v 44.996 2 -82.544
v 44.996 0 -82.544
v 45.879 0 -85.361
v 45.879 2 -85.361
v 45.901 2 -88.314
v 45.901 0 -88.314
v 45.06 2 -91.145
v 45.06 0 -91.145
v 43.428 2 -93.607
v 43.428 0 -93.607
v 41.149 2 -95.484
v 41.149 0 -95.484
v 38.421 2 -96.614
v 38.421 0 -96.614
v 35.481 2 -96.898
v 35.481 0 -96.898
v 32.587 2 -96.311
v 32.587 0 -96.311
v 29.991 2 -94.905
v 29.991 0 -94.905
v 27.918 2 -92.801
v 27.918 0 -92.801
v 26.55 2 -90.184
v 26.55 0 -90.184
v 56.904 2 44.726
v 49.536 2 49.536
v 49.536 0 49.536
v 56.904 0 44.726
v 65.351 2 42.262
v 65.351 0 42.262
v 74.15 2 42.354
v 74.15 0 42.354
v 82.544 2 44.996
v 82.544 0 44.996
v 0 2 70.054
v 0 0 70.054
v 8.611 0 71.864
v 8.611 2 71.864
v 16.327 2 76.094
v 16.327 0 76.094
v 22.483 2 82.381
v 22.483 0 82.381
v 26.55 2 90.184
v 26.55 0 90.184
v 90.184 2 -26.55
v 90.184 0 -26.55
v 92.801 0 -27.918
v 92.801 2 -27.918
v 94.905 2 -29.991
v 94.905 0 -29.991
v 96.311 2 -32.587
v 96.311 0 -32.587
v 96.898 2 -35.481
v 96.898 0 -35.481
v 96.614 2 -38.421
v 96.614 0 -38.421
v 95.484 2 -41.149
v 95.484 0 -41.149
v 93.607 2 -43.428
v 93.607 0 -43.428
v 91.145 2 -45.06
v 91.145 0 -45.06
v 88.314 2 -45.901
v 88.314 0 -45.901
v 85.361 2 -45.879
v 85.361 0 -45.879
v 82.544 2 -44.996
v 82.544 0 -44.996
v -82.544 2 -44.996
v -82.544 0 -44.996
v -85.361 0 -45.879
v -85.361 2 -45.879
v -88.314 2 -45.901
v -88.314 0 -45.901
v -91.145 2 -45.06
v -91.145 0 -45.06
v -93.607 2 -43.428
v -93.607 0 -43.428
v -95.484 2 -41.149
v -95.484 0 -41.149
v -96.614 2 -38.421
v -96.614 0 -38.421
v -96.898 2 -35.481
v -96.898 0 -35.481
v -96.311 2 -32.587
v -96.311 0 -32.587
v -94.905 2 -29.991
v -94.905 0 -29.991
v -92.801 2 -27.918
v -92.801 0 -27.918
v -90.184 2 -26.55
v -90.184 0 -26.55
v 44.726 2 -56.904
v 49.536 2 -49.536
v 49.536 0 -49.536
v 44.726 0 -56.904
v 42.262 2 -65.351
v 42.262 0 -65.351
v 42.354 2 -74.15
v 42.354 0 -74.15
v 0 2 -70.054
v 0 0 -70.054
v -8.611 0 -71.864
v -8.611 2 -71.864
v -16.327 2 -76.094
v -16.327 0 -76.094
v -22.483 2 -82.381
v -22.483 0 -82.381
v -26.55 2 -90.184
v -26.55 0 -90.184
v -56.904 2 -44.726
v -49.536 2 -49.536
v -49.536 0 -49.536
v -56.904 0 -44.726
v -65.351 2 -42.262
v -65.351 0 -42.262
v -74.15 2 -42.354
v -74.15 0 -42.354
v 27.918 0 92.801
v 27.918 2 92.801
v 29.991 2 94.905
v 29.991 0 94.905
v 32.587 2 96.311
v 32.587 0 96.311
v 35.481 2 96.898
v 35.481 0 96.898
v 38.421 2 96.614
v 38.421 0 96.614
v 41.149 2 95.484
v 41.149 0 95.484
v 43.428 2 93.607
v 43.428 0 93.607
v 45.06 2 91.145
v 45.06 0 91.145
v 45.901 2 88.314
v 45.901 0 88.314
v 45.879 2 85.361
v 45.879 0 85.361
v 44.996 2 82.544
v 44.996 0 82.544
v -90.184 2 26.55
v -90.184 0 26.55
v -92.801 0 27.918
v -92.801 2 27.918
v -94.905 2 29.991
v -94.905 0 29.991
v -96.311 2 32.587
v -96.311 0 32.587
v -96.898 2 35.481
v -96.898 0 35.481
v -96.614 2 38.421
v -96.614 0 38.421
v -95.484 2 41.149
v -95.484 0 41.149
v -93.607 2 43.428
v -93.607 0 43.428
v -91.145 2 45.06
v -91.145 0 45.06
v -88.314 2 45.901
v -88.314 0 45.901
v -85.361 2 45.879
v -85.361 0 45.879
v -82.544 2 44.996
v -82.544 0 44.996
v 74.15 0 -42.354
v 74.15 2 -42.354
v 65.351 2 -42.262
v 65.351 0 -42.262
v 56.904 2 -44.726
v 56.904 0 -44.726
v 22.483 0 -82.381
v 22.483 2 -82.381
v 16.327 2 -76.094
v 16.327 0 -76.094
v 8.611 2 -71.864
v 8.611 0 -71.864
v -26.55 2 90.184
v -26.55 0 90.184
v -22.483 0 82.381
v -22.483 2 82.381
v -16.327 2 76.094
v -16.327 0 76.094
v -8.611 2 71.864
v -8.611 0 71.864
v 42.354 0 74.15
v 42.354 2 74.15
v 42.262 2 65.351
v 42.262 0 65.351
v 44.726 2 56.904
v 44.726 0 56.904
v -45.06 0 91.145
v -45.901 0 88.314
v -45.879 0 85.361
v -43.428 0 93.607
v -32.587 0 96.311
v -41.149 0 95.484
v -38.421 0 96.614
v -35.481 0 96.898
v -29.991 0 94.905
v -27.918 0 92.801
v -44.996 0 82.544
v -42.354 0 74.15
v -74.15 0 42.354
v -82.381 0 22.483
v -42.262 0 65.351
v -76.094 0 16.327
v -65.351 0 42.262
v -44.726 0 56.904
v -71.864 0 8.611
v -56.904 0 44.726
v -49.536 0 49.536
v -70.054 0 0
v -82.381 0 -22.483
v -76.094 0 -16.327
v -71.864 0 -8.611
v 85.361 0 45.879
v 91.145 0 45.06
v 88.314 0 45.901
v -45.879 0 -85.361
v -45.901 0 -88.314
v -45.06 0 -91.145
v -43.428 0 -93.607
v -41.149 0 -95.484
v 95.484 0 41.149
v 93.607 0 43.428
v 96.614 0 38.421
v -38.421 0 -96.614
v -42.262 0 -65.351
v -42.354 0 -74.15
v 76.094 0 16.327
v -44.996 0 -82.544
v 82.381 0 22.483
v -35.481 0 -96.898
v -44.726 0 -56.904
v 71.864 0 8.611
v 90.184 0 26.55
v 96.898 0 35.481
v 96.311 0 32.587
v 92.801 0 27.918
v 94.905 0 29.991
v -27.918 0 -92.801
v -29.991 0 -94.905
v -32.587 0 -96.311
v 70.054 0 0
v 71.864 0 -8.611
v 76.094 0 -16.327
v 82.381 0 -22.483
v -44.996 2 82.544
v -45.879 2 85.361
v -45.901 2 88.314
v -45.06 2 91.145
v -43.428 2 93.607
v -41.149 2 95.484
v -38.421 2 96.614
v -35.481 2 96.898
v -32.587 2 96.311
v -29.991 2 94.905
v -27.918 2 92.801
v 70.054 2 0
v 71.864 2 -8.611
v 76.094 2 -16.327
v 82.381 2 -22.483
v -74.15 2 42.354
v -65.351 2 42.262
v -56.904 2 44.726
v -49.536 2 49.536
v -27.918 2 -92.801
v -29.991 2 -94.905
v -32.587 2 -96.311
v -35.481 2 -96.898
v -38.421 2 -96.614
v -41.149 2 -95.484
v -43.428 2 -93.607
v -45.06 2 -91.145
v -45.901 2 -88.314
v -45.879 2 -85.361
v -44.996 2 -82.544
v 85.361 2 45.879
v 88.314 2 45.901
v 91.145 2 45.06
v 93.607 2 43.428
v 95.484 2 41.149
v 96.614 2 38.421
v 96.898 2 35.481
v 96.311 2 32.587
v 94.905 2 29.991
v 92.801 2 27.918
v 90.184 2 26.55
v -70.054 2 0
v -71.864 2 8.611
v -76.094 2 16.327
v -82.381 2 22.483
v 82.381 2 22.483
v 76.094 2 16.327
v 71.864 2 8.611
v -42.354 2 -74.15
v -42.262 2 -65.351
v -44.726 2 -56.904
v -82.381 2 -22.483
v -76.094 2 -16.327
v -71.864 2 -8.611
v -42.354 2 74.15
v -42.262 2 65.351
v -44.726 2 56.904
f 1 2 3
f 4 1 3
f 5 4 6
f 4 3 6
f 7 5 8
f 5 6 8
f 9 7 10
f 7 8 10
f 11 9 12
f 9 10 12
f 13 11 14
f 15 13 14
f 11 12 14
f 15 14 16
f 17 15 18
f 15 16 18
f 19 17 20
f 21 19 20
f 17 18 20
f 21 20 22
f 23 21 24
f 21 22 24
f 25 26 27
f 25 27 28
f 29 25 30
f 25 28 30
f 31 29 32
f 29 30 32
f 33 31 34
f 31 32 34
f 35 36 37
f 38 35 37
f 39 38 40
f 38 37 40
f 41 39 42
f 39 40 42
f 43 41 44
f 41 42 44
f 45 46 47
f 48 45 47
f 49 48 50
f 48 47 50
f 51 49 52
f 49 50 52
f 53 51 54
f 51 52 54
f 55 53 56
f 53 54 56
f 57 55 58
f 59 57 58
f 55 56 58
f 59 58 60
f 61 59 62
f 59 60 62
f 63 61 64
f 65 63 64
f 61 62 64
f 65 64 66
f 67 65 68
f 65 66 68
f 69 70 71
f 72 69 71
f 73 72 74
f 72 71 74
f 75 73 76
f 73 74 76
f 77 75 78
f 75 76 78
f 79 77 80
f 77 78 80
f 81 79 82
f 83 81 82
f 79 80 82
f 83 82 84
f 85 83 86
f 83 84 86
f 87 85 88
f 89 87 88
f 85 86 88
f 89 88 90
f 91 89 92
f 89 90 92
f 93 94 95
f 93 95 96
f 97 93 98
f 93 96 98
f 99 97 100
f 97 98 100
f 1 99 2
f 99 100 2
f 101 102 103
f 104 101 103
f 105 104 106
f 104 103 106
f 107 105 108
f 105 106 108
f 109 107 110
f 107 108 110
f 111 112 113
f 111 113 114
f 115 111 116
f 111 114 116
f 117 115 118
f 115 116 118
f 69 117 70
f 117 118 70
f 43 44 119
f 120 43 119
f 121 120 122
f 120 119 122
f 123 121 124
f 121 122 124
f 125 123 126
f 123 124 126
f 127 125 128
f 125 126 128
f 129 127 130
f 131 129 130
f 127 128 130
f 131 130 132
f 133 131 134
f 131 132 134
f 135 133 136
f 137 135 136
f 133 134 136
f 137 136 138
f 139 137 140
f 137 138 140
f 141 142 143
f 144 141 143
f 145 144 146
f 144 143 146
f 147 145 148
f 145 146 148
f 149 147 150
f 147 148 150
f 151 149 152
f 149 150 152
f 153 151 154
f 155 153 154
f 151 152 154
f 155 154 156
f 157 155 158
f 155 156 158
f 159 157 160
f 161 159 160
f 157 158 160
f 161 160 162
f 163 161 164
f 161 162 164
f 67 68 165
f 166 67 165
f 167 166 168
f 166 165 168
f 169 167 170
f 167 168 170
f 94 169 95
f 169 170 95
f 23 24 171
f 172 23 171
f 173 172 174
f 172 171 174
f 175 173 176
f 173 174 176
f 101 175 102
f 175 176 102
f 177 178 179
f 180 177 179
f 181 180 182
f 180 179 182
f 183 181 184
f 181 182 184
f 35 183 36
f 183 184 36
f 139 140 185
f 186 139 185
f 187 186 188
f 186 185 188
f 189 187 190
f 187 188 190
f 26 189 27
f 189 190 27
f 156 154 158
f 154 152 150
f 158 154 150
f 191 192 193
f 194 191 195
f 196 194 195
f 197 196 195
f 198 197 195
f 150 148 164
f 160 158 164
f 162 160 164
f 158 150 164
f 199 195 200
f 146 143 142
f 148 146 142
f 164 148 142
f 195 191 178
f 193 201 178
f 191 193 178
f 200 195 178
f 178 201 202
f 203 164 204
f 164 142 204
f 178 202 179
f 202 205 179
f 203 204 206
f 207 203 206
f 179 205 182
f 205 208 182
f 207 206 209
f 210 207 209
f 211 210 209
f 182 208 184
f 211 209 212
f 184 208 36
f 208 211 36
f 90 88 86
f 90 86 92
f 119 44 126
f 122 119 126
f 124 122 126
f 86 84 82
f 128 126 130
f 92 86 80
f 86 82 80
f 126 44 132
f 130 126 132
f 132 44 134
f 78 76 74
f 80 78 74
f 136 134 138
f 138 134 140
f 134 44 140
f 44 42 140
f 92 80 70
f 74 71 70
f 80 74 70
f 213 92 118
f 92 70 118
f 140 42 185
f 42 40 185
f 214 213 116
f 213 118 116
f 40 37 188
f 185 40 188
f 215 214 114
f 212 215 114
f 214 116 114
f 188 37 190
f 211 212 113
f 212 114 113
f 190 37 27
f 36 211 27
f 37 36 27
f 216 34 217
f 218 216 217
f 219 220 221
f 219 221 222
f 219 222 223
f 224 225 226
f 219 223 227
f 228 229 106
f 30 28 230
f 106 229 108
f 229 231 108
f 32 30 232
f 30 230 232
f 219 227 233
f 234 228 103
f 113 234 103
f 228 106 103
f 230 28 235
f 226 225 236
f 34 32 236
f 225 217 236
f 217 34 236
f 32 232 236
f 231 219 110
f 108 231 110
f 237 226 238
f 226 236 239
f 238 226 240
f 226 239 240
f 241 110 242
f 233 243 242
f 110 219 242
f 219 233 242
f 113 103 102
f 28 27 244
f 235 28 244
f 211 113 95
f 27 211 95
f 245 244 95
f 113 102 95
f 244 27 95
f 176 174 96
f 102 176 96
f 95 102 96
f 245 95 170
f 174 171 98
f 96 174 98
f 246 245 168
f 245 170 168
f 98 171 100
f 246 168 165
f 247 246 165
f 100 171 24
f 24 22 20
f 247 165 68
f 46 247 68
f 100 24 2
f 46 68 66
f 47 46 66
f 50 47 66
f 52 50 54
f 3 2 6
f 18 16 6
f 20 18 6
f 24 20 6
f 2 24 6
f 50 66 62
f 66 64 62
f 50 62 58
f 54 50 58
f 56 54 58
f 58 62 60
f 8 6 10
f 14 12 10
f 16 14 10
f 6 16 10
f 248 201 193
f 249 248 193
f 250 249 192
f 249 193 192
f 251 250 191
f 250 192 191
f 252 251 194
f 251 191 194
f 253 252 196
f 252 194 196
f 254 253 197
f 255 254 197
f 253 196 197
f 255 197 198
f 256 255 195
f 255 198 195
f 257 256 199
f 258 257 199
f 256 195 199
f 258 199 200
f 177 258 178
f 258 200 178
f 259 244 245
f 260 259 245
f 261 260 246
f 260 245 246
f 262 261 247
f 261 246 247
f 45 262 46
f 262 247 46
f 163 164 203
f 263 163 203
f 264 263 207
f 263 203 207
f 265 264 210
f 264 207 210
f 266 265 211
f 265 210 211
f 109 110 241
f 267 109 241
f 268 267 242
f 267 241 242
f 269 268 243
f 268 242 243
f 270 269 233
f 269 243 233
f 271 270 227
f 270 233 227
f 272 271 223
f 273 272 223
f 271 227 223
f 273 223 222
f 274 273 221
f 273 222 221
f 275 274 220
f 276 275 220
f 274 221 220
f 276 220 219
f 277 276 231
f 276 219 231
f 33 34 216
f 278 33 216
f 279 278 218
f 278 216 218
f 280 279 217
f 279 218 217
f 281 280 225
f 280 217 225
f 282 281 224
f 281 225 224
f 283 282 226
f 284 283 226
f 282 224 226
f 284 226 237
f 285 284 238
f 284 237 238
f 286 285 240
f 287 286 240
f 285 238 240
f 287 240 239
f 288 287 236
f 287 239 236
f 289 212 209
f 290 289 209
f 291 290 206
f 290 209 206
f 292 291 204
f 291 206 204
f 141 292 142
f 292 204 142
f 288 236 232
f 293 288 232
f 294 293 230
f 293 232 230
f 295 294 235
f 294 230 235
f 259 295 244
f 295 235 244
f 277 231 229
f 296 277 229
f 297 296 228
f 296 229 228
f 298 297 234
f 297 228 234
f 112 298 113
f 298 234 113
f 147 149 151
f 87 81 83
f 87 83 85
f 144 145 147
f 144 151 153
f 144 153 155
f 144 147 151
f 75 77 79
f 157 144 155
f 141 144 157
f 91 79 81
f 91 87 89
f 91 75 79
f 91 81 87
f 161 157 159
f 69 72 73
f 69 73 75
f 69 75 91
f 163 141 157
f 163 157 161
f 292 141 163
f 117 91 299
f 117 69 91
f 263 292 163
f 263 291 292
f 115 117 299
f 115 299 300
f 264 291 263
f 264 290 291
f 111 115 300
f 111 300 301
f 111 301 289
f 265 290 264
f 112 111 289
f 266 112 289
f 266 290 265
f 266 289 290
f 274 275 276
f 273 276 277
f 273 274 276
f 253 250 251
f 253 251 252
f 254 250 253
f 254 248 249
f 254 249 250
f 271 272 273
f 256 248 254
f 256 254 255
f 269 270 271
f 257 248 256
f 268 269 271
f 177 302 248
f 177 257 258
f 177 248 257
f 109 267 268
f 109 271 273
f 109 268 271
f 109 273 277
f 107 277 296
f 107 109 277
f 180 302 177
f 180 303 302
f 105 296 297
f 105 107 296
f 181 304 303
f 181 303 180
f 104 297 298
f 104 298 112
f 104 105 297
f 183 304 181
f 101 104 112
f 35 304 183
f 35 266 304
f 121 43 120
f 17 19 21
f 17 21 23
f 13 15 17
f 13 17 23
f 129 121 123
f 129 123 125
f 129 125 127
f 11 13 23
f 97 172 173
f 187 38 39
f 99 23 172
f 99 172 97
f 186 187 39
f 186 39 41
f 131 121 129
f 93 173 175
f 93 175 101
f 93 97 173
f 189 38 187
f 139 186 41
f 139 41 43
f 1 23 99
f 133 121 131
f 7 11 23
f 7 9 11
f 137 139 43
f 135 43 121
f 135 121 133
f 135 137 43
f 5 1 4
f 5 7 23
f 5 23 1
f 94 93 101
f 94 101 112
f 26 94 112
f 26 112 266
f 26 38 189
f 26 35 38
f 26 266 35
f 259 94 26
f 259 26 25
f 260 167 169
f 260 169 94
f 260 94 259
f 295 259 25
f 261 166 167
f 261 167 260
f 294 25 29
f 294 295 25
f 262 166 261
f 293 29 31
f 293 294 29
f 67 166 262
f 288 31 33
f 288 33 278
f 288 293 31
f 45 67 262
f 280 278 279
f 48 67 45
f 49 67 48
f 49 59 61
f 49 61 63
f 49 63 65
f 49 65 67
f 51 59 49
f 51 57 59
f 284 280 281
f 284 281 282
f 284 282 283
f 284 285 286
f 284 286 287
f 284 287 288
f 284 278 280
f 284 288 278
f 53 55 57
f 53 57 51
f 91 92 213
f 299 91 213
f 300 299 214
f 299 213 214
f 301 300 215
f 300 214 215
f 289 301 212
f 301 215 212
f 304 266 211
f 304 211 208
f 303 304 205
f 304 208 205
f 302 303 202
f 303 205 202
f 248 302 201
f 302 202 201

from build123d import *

# Parameters (mm, degrees)
BOSS_EXTRUDE1_DEPTH = 2
CIRPATTERN1_COUNT   = 8


with BuildPart() as part:
    # Sketch1 → Boss-Extrude1 (new body)
    with BuildSketch(Plane(origin=(0, 0, 0), x_dir=(1, 0, 0), z_dir=(0, 1, 0))):
        with BuildLine():
            Line((28.994949366, -70), (70, -28.994949366))
            Line((70, -28.994949366), (70, 28.994949366))
            Line((70, 28.994949366), (28.994949366, 70))
            Line((28.994949366, 70), (1.798096452, 70))
            ThreePointArc((1.798096452, 70), (-15.601802765, 75.561434018), (-26.550475887, 90.183766184))
            ThreePointArc((-26.550475887, 90.183766184), (-39.826834324, 96.150483571), (-44.995531078, 82.543574165))
            ThreePointArc((-44.995531078, 82.543574165), (-42.397861857, 64.462142924), (-50.768920878, 48.226028488))
            Line((-50.768920878, 48.226028488), (-70, 28.994949366))
            Line((-70, 28.994949366), (-70, -28.994949366))
            Line((-70, -28.994949366), (-28.994949366, -70))
            Line((-28.994949366, -70), (28.994949366, -70))
        make_face()
    boss_extrude1 = extrude(amount=BOSS_EXTRUDE1_DEPTH)

    # CirPattern1: Boss-Extrude1 ×8 about axis
    cirpattern1_axis = Axis((0, 2.1, 0), (0, -1, 0))
    for i in range(1, CIRPATTERN1_COUNT):
        add(boss_extrude1.rotate(cirpattern1_axis, i * 360 / CIRPATTERN1_COUNT))


solid = part.part
